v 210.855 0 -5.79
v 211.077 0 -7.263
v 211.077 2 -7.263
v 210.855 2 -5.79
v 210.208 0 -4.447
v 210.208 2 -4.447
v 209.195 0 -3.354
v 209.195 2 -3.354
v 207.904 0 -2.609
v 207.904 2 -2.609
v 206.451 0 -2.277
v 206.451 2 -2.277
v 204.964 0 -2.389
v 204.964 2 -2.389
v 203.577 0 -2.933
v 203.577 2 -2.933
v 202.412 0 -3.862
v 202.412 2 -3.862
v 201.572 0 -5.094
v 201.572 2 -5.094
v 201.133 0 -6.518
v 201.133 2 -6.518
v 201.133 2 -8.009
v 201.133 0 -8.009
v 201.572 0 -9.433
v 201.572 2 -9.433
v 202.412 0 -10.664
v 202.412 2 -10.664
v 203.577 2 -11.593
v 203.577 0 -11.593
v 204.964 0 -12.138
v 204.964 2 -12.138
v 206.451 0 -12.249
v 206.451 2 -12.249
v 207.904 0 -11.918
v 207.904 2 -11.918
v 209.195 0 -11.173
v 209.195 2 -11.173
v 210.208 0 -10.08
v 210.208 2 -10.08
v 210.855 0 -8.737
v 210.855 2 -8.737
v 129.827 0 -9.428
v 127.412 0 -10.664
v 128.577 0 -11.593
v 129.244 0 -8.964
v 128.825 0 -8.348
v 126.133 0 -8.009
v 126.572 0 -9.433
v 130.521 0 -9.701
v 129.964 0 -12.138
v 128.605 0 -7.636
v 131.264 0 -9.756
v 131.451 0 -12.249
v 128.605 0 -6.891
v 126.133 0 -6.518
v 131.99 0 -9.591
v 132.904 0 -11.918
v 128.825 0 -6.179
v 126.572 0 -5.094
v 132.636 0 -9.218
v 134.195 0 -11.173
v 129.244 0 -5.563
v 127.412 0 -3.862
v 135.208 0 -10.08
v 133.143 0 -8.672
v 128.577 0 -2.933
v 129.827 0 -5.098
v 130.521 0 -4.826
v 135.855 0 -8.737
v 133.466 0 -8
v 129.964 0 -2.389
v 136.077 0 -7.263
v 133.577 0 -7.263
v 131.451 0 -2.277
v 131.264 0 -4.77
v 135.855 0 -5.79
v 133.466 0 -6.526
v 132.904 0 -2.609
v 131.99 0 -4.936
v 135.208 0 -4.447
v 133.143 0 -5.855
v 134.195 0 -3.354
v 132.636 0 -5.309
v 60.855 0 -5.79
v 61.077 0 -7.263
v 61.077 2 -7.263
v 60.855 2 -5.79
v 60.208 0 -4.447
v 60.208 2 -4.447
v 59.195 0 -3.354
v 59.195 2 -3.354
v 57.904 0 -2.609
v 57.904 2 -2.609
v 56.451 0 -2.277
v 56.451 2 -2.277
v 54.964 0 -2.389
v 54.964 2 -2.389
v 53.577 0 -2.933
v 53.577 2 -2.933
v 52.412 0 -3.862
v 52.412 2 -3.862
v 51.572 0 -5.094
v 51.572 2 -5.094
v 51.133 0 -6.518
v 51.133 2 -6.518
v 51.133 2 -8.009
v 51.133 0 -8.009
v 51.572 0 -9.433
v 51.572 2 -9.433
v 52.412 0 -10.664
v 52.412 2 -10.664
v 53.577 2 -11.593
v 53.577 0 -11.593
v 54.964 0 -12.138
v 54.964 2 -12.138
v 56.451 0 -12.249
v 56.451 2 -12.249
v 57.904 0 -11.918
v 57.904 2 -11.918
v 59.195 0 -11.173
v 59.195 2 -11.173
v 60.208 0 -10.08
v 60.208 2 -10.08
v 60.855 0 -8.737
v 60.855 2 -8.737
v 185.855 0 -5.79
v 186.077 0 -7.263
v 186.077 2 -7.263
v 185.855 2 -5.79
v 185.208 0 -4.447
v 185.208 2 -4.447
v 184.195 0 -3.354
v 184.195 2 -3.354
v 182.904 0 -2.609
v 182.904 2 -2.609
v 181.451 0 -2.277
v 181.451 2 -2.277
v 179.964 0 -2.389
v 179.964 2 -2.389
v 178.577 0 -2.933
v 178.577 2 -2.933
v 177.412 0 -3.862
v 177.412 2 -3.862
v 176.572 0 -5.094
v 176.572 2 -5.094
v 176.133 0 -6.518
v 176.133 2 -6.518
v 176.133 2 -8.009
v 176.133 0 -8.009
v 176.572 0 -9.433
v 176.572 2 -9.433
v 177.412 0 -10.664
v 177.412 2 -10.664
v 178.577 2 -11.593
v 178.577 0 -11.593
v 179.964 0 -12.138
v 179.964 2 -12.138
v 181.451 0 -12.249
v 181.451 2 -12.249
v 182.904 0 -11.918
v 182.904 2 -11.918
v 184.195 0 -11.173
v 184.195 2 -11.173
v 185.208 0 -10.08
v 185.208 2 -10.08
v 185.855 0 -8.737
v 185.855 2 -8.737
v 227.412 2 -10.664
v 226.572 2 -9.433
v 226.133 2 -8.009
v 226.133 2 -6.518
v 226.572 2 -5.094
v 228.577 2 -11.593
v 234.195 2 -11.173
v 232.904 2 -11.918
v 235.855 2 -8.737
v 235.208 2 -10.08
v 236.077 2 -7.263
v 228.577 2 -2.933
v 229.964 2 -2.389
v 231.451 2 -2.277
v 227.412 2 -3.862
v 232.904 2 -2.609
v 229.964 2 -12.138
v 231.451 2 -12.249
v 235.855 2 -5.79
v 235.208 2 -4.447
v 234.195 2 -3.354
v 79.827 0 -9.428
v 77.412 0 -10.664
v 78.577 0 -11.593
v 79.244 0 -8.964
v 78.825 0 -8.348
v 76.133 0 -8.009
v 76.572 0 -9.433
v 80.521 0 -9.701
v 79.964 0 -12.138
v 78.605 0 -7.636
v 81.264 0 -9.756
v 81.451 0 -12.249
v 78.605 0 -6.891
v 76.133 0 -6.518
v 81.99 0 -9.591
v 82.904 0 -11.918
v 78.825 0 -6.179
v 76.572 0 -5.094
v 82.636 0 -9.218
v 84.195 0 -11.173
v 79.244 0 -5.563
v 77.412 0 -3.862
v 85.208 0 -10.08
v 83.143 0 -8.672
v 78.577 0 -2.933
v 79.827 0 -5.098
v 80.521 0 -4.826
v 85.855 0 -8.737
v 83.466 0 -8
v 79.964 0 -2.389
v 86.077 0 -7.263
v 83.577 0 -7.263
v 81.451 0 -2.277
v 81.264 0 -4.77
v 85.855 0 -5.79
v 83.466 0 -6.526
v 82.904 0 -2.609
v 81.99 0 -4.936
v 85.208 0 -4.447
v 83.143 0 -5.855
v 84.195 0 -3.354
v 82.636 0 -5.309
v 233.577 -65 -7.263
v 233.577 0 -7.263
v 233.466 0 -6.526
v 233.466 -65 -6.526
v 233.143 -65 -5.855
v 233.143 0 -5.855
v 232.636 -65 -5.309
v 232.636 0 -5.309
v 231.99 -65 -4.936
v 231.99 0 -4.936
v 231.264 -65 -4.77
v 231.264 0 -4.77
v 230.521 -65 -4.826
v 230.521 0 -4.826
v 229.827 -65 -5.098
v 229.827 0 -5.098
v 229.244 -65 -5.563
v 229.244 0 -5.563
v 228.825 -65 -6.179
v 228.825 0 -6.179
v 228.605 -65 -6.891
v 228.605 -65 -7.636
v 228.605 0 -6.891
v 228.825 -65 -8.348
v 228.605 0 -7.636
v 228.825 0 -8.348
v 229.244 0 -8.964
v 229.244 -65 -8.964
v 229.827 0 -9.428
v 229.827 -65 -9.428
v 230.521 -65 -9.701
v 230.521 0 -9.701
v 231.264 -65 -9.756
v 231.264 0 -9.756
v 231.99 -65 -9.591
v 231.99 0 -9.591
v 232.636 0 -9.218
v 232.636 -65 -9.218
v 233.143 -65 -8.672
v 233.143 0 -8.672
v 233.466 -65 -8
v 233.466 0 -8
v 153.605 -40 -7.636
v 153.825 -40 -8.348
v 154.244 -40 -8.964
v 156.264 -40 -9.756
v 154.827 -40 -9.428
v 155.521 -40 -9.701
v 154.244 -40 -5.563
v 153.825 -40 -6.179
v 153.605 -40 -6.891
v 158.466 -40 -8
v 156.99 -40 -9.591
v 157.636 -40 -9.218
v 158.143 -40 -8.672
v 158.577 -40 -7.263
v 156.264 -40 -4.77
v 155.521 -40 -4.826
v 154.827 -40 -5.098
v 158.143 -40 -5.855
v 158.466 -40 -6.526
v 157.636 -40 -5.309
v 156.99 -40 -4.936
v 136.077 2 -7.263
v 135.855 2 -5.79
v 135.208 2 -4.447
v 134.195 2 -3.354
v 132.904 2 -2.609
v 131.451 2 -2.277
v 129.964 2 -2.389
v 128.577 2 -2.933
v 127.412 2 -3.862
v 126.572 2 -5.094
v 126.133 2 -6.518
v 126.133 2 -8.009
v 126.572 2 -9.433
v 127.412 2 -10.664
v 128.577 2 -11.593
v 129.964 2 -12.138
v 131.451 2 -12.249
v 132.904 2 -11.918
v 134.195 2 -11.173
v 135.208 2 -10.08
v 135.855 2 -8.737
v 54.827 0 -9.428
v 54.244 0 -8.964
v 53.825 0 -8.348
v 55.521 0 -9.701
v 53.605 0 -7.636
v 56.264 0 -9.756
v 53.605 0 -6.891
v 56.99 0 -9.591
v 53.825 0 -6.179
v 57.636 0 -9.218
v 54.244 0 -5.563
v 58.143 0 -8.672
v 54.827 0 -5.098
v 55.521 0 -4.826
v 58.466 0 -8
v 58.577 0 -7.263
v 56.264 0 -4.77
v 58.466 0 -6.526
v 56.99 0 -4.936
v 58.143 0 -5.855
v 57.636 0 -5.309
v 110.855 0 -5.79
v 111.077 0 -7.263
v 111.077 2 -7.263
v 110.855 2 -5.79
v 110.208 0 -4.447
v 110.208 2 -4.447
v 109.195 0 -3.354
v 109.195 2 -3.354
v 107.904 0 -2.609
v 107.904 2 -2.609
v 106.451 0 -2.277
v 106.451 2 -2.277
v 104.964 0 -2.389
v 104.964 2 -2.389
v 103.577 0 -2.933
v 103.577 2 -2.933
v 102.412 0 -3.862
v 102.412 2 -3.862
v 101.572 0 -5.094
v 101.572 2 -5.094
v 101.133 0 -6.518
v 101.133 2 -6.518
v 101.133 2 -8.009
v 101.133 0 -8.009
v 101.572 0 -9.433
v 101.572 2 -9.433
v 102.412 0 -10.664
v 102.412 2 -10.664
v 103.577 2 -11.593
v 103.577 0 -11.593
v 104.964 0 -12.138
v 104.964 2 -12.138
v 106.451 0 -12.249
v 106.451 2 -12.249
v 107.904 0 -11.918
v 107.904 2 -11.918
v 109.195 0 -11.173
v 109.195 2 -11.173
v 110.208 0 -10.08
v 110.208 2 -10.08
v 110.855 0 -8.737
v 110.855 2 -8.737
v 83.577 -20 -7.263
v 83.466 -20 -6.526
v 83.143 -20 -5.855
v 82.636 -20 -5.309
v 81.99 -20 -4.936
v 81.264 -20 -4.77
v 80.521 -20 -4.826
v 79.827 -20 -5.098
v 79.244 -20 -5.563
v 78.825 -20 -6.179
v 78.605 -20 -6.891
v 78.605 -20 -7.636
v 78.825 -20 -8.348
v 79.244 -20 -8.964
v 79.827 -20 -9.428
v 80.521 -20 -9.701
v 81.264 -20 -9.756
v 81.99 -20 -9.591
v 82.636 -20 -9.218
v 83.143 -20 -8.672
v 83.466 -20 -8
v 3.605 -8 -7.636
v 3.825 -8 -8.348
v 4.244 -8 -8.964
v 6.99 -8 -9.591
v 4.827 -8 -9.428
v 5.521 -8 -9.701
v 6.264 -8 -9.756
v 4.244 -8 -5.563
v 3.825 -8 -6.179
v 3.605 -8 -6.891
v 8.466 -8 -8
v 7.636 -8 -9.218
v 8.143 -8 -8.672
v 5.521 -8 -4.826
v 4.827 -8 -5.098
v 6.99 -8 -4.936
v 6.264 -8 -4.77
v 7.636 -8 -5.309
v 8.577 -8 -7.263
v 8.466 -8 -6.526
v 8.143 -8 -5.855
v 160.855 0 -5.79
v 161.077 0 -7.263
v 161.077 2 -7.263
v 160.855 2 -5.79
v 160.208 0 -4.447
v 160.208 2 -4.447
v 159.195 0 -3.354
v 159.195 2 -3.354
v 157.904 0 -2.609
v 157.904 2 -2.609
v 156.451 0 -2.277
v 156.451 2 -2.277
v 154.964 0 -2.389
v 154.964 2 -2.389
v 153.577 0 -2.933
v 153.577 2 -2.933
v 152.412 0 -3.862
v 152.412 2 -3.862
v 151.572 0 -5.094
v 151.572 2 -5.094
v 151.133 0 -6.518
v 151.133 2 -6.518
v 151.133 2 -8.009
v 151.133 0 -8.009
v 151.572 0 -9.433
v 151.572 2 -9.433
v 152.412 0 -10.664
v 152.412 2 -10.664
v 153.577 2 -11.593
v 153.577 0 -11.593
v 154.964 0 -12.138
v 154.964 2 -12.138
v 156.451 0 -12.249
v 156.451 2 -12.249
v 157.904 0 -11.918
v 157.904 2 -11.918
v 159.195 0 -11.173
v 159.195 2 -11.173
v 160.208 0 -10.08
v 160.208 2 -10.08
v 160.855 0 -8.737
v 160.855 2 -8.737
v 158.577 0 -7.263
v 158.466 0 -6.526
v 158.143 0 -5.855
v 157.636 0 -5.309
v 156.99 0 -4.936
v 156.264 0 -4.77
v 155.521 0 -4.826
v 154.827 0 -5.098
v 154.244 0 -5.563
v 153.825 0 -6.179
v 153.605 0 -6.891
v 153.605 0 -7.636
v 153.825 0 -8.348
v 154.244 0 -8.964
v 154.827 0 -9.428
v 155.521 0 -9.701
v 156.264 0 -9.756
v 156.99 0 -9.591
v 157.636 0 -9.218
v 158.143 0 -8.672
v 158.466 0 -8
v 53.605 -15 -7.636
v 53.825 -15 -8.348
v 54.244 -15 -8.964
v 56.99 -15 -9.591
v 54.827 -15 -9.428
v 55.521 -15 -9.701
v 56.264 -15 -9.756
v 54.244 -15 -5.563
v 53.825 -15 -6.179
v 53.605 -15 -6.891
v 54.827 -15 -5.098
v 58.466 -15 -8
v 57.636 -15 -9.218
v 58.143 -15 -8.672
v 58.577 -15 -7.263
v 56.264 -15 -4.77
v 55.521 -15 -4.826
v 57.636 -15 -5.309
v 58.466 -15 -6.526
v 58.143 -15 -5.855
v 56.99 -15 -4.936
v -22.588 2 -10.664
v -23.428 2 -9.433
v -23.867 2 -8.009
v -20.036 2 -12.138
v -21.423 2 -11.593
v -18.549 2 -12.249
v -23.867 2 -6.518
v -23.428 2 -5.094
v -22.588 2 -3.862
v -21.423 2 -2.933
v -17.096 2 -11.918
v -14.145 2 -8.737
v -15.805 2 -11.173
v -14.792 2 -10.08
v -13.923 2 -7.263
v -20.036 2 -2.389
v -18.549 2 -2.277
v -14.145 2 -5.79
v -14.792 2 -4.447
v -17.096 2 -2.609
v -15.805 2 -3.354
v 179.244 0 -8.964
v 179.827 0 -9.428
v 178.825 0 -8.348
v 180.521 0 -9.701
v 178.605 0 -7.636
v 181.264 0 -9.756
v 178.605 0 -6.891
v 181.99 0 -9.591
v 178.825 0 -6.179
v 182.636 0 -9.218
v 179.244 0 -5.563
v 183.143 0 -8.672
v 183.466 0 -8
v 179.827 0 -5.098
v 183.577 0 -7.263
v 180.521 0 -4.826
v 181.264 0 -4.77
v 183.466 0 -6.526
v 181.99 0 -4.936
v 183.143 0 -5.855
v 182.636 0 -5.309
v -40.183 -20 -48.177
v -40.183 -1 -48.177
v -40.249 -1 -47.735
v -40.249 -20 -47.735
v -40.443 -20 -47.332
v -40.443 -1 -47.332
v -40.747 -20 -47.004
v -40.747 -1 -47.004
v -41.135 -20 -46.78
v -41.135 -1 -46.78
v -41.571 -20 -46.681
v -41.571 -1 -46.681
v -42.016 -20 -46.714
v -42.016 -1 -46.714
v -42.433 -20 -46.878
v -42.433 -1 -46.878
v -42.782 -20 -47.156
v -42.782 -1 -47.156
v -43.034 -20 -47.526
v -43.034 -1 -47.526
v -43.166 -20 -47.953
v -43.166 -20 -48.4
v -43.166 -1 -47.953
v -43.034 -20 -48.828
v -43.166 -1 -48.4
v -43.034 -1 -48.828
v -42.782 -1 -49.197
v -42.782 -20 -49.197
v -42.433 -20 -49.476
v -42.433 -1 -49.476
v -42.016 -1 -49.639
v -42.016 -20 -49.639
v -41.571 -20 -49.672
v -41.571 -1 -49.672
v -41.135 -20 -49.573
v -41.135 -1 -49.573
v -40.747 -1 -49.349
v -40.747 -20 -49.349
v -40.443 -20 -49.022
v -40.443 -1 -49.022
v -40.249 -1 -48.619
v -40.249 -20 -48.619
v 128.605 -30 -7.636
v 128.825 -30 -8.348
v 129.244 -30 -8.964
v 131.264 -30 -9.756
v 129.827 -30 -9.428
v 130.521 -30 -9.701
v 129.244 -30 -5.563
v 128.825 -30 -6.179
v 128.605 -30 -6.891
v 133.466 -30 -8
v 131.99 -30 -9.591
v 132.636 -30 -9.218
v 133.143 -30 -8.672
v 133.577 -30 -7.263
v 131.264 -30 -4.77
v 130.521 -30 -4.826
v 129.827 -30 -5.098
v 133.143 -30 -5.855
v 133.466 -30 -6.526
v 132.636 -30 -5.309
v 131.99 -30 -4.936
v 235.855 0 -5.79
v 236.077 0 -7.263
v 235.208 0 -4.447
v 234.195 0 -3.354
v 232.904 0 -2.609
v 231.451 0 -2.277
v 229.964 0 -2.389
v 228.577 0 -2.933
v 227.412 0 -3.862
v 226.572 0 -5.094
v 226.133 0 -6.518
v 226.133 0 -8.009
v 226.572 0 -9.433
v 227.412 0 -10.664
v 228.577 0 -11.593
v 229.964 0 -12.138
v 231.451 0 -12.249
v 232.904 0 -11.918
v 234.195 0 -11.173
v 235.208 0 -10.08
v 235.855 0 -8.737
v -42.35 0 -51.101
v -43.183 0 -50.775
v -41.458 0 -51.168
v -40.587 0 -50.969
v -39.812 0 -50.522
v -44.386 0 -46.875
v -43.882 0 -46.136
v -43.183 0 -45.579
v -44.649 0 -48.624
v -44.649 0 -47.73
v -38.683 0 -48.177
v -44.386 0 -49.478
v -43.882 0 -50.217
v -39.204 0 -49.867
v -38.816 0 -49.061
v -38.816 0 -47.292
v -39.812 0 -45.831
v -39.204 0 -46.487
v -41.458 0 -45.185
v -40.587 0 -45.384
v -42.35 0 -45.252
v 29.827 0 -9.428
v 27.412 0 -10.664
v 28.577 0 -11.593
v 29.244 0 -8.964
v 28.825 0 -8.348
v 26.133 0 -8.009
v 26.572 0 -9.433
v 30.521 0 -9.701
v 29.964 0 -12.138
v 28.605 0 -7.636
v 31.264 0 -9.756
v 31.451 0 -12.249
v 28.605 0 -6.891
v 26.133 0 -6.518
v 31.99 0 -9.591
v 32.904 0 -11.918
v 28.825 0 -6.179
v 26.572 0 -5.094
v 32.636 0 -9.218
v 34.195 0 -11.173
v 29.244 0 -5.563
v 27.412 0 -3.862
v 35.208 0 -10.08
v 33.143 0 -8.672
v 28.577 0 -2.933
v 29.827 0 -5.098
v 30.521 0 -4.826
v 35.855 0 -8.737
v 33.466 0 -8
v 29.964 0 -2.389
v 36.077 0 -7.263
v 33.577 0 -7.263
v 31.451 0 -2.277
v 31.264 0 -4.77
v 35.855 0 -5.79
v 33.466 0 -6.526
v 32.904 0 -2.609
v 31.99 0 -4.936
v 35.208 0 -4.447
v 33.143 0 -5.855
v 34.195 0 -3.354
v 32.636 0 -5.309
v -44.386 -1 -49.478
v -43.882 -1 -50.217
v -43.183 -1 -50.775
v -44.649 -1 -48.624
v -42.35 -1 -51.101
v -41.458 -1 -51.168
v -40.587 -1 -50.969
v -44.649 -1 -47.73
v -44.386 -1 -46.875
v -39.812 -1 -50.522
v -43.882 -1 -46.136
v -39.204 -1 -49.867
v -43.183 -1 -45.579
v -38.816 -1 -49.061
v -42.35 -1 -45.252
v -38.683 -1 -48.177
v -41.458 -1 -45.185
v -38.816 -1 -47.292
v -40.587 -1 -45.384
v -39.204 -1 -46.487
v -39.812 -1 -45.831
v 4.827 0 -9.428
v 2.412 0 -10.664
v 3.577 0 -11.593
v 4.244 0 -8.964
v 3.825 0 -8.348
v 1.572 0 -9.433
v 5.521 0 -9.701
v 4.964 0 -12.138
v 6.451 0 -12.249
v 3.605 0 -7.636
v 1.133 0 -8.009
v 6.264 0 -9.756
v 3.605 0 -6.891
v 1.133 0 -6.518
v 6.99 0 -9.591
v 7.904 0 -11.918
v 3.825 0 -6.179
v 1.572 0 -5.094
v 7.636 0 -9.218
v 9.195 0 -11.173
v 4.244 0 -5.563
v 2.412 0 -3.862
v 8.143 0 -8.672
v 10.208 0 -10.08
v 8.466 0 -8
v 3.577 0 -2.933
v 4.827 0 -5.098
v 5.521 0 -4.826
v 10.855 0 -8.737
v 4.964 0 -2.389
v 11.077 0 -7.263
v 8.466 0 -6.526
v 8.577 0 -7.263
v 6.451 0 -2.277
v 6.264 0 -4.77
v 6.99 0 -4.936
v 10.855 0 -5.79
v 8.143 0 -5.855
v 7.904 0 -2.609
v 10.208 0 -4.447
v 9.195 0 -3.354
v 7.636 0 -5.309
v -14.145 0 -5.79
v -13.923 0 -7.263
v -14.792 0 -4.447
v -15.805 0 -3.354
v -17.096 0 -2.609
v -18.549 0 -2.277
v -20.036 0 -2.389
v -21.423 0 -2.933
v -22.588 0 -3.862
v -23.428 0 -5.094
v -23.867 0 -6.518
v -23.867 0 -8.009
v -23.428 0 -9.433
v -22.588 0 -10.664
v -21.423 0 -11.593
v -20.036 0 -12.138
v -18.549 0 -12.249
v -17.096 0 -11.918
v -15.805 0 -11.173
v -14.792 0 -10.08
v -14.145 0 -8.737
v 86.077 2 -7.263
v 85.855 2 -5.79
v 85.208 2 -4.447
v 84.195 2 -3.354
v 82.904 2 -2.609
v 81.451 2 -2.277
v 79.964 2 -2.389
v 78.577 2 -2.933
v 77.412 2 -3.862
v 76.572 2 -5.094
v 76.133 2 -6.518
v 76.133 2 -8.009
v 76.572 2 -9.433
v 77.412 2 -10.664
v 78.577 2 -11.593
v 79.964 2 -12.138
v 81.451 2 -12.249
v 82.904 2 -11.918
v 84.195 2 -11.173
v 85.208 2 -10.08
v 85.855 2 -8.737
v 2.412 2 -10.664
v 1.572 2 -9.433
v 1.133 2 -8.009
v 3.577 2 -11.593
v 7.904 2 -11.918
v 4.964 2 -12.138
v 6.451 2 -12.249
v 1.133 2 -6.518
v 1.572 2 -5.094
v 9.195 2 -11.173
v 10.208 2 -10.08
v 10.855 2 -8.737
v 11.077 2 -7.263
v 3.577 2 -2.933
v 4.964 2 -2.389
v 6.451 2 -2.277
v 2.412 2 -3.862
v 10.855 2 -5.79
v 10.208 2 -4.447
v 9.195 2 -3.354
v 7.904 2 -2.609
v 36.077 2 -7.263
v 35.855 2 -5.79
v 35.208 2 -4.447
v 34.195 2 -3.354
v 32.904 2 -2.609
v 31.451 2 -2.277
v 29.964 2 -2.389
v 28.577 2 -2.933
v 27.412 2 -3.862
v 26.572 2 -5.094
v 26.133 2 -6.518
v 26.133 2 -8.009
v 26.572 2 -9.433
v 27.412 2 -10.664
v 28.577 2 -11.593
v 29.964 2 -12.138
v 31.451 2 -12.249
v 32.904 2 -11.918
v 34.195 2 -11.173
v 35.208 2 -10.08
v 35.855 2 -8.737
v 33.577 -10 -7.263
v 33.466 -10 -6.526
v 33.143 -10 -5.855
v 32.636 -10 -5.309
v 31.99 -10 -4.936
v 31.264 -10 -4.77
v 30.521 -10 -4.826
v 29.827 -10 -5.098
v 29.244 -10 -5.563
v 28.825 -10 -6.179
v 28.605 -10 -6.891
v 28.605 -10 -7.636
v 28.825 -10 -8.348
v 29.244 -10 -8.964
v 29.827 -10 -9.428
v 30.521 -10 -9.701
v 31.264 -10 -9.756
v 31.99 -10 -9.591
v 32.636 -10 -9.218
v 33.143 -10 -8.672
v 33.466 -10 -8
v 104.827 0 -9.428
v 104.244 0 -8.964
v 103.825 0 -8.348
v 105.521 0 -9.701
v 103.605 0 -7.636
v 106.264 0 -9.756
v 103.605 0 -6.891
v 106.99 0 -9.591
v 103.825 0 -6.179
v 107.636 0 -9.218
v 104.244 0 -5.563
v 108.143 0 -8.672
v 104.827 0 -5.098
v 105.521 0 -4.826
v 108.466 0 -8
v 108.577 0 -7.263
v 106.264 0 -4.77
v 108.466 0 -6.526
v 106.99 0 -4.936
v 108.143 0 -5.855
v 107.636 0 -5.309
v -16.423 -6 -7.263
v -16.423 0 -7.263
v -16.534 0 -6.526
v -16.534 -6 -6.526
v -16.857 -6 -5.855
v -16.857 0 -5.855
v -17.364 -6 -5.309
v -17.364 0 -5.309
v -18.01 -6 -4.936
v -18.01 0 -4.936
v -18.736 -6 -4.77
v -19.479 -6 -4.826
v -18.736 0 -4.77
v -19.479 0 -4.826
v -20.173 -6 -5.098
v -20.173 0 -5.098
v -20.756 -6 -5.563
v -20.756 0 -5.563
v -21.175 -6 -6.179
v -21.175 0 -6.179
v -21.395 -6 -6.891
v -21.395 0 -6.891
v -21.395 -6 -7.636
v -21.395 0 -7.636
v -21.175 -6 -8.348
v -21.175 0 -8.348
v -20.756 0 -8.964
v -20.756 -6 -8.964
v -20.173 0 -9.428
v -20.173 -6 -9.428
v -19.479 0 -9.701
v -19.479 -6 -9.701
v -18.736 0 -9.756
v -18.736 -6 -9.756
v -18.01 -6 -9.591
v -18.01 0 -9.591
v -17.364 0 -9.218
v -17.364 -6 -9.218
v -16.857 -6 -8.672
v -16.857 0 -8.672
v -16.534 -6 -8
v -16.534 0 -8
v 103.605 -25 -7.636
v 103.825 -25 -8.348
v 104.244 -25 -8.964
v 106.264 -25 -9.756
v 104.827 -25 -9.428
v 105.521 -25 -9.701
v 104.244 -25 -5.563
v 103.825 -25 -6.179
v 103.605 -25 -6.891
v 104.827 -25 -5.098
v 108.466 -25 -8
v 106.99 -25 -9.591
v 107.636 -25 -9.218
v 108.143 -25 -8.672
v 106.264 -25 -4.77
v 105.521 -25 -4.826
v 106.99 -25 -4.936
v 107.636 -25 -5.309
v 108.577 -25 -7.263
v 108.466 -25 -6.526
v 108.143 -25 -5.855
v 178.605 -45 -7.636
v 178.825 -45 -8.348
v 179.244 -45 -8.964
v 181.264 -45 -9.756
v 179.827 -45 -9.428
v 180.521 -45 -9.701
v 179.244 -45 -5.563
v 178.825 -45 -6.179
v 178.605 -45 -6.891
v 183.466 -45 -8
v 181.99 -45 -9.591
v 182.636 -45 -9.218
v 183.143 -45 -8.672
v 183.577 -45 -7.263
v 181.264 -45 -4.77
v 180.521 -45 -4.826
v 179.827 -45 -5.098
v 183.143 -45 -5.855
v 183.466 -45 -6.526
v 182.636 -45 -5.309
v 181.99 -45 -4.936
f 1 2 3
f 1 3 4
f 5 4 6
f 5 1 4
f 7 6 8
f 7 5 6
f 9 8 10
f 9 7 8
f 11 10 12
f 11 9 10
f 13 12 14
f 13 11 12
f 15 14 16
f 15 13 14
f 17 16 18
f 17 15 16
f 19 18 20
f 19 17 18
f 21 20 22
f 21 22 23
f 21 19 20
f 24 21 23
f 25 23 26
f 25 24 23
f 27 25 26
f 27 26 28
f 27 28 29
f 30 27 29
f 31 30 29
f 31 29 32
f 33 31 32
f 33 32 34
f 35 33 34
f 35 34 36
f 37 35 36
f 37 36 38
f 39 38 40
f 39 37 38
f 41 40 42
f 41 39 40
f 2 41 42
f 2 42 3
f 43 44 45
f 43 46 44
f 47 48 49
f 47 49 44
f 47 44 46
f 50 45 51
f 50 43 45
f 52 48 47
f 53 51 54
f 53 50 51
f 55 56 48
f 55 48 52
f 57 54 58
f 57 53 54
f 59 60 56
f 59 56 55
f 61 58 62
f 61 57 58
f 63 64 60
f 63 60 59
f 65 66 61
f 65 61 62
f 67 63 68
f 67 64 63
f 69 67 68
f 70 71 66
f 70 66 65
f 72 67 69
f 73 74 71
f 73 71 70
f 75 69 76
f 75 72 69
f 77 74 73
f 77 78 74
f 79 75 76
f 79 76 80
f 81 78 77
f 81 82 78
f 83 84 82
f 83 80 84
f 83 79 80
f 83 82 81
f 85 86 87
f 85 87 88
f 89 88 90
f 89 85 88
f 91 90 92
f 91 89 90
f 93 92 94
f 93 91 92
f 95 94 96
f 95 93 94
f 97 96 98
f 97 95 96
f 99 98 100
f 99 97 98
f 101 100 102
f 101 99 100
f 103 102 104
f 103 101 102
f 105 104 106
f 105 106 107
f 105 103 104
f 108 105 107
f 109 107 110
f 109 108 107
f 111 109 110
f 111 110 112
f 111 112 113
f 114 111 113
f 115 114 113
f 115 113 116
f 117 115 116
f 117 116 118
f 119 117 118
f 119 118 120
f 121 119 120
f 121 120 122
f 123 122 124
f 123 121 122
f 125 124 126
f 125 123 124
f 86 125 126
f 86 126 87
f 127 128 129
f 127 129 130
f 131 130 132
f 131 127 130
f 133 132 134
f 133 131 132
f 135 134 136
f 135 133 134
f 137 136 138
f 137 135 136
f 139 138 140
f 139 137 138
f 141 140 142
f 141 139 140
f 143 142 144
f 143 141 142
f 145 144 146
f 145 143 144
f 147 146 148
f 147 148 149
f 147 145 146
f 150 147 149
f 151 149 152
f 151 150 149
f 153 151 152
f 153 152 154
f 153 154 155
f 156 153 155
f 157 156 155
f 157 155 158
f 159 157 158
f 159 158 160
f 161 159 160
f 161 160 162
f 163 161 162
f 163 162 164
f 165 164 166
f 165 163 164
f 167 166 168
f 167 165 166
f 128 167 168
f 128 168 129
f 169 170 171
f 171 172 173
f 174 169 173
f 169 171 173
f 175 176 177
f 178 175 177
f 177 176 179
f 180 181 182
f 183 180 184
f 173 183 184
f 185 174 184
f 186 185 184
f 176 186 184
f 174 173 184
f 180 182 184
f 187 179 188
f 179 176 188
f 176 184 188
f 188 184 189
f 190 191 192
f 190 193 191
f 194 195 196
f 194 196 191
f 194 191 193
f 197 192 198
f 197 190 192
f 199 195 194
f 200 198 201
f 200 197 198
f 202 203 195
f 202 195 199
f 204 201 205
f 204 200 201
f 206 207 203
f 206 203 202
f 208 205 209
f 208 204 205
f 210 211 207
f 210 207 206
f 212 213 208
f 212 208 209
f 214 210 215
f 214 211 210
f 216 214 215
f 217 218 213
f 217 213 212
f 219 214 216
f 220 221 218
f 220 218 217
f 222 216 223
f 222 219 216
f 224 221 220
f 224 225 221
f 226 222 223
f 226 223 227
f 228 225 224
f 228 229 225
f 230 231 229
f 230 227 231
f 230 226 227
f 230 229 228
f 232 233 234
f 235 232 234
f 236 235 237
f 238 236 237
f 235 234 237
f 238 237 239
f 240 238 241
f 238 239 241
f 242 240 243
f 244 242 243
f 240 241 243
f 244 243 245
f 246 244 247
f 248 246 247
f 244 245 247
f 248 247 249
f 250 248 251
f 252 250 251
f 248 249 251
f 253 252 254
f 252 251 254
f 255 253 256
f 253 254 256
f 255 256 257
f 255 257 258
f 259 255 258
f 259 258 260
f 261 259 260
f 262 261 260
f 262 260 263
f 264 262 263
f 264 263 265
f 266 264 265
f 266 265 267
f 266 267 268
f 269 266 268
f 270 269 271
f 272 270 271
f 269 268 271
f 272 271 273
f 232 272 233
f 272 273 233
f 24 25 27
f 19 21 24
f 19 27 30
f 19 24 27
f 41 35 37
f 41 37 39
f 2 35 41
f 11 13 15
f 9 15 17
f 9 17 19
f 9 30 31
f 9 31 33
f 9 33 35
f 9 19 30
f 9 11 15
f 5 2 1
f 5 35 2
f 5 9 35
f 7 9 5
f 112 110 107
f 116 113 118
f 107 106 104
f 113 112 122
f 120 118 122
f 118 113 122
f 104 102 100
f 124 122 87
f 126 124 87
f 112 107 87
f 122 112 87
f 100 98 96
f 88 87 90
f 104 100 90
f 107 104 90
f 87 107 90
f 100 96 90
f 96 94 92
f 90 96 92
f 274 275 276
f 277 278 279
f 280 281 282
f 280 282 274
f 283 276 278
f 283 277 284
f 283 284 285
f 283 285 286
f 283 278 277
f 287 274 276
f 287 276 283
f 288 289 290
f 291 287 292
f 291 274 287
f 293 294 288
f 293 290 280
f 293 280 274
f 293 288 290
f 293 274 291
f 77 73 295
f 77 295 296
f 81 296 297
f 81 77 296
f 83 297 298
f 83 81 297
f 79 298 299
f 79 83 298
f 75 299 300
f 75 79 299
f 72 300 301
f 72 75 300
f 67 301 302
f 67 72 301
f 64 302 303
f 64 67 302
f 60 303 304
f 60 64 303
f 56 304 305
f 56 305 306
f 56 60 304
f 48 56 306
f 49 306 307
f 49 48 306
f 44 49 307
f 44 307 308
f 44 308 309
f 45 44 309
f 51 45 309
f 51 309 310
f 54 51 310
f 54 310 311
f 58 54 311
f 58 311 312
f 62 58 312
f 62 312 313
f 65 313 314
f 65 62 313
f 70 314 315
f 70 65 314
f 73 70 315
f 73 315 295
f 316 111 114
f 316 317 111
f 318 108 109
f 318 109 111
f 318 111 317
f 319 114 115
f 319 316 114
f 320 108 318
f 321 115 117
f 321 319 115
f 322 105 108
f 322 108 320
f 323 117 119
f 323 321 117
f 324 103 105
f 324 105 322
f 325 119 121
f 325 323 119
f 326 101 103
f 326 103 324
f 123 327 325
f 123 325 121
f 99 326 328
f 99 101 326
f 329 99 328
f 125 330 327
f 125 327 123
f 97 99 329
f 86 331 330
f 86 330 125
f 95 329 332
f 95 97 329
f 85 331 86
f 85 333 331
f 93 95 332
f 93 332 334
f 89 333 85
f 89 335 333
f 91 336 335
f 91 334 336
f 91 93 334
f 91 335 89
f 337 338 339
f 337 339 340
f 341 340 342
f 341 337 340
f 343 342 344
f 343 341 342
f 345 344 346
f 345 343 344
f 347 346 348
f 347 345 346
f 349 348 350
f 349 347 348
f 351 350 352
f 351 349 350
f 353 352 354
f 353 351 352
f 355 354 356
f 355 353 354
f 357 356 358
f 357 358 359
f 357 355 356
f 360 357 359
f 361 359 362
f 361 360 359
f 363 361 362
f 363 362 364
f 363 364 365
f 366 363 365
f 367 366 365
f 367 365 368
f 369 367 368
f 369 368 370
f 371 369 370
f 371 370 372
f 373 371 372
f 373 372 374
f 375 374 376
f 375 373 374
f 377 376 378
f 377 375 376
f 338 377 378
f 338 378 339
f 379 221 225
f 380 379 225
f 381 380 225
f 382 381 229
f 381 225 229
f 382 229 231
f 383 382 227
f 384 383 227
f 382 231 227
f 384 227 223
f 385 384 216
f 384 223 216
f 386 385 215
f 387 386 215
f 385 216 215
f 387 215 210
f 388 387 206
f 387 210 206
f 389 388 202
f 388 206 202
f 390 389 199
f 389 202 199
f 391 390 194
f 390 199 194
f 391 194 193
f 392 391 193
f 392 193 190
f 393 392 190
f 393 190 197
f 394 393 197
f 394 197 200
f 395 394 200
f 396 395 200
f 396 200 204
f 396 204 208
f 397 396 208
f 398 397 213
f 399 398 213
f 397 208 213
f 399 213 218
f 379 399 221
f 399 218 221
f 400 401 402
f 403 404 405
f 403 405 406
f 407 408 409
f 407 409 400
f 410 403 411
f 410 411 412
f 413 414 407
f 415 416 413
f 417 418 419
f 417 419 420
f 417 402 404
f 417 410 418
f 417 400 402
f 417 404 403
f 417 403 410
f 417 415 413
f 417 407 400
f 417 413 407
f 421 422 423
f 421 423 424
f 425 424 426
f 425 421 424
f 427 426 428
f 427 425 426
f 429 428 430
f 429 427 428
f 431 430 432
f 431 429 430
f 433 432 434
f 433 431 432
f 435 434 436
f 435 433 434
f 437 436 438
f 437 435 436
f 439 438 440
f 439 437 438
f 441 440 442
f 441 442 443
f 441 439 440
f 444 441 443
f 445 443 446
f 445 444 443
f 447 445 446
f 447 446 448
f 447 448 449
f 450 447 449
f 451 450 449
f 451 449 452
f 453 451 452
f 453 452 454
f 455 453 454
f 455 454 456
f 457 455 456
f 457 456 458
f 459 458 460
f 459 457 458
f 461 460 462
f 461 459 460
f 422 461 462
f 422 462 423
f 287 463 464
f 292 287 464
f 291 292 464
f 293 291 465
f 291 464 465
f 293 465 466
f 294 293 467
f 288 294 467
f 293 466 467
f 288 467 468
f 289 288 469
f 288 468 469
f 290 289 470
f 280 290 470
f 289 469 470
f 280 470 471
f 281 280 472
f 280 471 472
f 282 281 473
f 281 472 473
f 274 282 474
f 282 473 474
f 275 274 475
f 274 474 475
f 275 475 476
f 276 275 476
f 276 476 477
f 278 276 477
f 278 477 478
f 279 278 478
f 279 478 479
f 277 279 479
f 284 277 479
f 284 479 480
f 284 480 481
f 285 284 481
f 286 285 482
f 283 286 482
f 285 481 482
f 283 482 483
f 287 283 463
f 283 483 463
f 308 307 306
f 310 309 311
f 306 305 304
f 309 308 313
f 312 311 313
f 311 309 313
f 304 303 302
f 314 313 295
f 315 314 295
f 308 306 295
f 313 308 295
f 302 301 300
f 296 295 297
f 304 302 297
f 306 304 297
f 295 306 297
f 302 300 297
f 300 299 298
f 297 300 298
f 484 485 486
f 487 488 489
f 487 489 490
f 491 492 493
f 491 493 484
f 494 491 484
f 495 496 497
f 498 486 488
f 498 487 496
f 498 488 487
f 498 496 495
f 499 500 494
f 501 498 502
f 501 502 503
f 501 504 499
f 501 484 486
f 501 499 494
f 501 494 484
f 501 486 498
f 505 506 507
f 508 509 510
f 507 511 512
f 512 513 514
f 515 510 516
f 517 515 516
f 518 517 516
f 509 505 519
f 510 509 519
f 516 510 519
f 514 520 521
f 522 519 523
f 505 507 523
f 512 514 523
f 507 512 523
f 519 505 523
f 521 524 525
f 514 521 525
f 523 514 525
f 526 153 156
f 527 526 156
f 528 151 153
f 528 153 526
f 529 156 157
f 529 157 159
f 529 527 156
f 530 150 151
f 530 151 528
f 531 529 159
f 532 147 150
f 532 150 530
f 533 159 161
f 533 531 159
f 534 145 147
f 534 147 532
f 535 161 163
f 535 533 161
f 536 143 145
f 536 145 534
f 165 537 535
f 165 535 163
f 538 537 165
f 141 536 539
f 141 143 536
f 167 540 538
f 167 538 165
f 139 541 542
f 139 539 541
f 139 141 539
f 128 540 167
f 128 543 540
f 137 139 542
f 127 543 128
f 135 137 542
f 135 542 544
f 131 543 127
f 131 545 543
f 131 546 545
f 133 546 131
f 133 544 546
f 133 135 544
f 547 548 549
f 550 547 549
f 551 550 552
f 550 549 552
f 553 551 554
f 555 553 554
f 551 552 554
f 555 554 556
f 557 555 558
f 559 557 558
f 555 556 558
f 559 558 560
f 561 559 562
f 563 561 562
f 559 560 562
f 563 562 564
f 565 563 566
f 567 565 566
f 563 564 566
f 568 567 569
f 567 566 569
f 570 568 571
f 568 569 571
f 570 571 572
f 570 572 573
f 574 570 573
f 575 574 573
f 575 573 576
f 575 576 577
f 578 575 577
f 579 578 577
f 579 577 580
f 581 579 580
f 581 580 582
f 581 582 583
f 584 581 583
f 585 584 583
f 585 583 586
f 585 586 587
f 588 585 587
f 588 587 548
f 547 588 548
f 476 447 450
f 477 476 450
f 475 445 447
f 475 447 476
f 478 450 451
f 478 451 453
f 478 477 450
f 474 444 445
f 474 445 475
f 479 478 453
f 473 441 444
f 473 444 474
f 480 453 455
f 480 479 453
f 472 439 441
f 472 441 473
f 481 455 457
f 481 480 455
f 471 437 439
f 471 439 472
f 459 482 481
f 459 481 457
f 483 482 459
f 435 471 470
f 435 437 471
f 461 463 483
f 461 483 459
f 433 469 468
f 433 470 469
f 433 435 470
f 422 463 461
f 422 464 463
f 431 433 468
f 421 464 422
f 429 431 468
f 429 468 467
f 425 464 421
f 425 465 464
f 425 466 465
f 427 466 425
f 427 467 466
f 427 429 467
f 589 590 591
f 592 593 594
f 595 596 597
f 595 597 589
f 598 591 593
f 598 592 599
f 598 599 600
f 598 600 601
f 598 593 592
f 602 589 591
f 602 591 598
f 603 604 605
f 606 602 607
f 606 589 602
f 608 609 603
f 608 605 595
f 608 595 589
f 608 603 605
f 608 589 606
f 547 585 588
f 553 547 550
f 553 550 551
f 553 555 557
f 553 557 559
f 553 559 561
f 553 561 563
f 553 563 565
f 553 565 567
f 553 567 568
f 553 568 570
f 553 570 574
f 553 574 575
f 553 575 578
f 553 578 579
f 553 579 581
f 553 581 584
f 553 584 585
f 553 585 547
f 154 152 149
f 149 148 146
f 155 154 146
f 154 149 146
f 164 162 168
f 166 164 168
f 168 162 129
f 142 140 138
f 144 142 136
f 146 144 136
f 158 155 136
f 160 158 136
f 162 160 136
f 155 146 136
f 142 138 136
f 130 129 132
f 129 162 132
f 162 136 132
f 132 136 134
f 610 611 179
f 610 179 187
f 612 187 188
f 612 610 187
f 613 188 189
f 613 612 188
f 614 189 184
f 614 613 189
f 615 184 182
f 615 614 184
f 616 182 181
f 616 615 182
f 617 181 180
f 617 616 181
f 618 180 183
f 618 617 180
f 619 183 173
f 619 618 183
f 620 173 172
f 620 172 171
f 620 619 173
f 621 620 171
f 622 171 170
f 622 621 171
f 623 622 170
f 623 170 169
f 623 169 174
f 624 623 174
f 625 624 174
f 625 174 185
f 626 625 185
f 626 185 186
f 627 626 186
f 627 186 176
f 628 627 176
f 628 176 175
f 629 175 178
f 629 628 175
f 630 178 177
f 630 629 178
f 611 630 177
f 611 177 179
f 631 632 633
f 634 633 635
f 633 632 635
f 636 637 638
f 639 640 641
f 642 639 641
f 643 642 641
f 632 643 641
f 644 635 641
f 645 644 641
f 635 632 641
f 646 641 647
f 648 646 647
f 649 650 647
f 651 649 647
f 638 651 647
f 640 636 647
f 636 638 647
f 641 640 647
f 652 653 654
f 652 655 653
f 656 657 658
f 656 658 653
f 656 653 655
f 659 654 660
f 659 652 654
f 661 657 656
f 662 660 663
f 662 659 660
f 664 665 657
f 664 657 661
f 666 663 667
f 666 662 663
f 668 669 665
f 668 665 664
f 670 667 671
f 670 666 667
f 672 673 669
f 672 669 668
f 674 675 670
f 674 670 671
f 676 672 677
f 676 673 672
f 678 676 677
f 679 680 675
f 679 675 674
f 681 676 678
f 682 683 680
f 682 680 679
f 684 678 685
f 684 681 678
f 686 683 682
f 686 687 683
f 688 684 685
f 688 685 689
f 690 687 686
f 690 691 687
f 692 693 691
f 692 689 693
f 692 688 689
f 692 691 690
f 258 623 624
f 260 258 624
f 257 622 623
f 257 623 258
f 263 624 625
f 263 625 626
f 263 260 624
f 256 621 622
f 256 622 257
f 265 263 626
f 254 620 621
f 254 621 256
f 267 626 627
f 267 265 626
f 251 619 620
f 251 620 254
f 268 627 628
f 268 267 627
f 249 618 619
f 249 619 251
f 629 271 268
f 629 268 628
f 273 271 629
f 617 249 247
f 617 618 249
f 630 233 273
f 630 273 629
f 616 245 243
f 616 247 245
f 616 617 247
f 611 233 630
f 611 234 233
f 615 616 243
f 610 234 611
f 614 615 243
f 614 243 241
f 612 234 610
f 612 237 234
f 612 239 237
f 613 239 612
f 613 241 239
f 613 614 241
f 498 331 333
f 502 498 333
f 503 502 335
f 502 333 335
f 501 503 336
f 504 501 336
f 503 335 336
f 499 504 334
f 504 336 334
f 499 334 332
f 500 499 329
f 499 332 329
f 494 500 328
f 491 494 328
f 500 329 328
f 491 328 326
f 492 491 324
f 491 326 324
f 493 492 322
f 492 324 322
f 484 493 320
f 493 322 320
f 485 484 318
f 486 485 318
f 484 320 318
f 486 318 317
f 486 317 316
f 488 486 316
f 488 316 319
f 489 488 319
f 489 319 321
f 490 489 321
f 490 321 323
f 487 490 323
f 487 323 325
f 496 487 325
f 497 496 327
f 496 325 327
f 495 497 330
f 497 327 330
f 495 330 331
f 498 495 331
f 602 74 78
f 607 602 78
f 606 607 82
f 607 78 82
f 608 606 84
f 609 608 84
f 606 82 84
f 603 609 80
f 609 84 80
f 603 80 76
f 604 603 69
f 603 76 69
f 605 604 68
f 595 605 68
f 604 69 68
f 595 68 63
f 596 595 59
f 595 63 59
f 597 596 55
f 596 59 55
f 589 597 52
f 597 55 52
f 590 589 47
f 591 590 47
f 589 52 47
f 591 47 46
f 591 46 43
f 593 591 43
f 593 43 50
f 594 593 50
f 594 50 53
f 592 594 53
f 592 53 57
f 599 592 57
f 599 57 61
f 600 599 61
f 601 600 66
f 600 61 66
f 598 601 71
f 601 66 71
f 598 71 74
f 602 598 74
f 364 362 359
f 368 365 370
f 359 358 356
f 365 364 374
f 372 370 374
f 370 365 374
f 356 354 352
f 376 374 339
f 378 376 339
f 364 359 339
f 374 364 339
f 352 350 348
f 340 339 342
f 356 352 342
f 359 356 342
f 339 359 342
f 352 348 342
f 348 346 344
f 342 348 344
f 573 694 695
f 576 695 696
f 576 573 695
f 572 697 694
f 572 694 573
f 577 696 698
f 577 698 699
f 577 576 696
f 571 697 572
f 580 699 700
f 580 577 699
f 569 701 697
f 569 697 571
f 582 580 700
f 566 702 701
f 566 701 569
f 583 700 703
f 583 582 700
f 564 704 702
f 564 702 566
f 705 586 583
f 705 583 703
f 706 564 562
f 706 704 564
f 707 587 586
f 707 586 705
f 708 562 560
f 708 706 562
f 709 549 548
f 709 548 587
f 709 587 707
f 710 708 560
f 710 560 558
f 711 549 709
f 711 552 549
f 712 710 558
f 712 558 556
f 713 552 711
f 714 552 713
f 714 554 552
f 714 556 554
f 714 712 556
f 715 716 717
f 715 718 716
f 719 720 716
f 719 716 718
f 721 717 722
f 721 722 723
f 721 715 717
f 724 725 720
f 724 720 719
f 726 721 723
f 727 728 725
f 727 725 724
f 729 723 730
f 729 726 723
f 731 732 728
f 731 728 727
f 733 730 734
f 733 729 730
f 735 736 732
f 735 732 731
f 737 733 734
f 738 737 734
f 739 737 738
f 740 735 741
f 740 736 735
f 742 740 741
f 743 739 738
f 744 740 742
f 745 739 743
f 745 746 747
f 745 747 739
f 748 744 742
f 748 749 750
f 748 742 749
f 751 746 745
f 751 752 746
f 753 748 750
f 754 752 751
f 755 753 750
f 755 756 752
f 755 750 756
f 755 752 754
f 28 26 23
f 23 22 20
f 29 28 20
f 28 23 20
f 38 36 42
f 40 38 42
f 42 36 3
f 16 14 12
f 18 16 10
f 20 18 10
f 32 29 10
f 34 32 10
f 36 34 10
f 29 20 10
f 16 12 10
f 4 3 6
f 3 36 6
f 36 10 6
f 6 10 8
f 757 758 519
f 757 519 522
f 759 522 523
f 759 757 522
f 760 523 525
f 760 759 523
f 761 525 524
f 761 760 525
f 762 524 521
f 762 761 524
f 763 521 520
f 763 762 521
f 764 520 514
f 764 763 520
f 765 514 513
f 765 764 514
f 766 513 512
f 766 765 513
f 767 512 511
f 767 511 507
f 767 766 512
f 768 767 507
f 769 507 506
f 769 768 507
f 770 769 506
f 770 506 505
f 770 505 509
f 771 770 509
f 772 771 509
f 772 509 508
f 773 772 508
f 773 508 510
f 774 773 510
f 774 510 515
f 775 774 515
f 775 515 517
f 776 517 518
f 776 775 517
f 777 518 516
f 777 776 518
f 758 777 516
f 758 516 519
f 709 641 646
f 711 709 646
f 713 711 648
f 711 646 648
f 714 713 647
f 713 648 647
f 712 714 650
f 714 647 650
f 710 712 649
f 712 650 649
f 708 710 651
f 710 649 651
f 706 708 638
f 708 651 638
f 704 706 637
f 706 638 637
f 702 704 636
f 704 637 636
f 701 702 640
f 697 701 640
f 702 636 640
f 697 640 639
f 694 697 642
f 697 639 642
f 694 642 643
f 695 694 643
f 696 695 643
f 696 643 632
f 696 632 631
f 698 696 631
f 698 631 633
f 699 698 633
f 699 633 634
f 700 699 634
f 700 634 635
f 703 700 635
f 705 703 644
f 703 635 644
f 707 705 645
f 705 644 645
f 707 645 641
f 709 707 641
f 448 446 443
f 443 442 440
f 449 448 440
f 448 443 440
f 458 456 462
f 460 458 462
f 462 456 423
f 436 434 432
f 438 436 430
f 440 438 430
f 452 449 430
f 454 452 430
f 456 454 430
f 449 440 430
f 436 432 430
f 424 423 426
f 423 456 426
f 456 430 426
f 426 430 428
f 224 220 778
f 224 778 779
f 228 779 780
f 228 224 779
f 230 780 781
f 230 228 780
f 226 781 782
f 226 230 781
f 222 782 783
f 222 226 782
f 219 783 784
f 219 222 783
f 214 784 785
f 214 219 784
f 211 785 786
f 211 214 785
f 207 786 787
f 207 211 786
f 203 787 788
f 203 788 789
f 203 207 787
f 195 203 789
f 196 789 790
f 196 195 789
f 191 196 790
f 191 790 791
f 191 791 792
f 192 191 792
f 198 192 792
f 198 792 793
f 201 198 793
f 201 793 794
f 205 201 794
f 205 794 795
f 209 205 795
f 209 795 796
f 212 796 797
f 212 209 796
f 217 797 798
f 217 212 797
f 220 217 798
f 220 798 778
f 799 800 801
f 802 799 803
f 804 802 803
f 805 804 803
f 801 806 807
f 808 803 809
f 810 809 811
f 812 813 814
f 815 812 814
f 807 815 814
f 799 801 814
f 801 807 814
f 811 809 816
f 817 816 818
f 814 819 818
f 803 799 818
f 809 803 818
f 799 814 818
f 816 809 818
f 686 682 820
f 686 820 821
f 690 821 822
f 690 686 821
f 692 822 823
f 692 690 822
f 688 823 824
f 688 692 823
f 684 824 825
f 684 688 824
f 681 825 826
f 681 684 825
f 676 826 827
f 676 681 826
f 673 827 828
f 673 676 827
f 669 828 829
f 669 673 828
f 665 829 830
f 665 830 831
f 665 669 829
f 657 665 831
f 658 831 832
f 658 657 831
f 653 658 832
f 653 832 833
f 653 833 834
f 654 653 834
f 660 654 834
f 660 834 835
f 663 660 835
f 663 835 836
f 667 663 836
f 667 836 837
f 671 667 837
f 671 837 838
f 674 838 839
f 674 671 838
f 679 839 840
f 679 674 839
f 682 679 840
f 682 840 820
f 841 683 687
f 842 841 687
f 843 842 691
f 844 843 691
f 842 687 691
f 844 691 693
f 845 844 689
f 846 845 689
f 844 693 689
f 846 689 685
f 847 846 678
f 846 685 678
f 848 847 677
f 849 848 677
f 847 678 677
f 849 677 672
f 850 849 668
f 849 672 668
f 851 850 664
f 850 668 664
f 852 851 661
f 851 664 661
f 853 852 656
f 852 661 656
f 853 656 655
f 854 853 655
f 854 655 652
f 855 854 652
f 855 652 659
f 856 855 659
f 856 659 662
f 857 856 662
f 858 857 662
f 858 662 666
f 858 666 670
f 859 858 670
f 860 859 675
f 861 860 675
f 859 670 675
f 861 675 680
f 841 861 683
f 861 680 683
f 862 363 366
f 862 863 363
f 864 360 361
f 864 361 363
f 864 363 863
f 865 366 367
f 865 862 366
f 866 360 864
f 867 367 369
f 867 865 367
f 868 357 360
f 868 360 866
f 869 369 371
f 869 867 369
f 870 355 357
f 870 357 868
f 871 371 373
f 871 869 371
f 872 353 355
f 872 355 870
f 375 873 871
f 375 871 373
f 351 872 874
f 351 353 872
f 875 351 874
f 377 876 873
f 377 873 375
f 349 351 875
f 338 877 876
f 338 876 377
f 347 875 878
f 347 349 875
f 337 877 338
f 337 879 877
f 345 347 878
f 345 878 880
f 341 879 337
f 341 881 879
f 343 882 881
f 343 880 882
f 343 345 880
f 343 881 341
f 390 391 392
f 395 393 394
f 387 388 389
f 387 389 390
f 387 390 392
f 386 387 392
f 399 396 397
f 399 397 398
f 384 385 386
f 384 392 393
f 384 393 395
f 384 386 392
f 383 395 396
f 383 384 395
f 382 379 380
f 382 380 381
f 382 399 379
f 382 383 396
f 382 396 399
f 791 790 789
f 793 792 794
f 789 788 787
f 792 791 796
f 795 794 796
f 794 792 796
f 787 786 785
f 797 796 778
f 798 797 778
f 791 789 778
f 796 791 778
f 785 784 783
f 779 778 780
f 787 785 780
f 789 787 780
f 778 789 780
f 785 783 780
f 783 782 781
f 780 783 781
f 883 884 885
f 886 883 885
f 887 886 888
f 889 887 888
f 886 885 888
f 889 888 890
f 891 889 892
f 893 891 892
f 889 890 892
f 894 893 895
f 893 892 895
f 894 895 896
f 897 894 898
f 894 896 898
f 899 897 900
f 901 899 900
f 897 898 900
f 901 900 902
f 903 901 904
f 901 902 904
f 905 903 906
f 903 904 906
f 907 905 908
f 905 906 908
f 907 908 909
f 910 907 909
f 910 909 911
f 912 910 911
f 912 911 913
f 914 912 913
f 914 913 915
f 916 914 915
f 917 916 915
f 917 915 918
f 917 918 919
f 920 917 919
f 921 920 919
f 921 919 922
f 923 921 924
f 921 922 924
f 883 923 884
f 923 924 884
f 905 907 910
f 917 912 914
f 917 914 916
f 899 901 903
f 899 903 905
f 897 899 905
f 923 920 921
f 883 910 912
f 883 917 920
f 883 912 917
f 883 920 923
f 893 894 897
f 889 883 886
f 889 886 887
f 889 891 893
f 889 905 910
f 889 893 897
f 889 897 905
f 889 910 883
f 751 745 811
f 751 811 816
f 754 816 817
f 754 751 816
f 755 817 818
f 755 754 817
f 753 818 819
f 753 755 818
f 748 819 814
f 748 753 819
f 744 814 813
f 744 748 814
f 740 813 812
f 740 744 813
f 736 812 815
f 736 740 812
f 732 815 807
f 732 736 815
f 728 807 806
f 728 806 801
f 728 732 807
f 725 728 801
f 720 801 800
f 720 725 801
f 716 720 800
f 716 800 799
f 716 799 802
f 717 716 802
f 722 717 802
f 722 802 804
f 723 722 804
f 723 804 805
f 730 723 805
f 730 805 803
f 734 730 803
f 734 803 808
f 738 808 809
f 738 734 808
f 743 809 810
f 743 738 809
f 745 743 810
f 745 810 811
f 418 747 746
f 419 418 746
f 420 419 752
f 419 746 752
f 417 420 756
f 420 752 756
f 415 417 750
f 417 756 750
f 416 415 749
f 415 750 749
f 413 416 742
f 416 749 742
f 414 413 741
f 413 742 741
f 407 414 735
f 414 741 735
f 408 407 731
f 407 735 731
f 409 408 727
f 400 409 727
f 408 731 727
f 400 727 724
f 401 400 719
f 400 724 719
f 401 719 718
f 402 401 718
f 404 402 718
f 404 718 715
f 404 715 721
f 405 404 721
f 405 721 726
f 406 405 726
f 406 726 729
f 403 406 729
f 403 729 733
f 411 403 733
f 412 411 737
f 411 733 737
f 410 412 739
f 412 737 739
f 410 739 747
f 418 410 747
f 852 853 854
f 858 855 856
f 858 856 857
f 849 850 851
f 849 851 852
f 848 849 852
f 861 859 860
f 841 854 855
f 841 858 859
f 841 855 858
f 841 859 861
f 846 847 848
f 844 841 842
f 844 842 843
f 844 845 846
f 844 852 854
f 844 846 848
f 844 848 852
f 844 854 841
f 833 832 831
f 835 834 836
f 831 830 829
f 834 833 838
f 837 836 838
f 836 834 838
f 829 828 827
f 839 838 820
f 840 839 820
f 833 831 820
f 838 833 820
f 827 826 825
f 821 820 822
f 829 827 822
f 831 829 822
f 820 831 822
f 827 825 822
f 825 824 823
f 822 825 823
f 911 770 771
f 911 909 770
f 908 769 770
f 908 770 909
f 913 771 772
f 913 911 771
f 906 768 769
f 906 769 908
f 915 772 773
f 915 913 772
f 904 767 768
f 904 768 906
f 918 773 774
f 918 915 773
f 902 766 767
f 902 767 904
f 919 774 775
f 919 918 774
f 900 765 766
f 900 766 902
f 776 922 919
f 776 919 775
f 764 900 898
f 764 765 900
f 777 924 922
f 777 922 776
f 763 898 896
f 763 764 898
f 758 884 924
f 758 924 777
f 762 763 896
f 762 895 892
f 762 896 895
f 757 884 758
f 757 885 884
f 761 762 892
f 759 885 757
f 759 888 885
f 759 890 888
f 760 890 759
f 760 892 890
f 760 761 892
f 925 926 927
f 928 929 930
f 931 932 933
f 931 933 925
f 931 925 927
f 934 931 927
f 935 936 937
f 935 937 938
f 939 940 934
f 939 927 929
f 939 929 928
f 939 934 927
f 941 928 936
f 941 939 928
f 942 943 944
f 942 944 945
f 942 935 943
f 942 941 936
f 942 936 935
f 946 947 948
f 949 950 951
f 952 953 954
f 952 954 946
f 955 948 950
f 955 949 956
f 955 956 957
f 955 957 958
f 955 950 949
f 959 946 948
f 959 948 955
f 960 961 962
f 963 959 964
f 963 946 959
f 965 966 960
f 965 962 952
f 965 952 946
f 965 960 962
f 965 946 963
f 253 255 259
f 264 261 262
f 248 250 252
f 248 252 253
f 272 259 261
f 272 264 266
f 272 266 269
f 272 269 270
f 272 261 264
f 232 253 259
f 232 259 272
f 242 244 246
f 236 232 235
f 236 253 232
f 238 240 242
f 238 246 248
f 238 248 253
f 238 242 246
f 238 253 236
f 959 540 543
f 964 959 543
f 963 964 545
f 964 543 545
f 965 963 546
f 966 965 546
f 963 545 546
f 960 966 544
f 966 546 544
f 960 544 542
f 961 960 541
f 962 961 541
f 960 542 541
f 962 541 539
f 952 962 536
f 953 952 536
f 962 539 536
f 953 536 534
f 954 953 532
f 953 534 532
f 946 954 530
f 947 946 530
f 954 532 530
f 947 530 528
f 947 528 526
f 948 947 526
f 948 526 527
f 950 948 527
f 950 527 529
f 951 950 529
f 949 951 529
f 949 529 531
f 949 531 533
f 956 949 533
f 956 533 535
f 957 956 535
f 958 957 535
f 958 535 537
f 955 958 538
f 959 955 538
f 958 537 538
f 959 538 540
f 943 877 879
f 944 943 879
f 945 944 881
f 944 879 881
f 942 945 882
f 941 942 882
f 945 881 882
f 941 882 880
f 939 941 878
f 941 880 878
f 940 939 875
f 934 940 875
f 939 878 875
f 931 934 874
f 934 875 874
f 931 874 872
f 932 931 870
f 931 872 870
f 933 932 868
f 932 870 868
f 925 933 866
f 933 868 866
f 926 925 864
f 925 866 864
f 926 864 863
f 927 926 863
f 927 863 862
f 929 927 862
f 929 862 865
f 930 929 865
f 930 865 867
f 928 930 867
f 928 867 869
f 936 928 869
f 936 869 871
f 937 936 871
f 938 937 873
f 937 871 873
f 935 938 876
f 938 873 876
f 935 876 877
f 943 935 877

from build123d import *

# Parameters (mm, degrees)
F0_R      = 5
F0_R_2    = 2.5
F1_DEPTH  = 2
F2_DEPTH  = 6
F3_DEPTH  = 8
F4_DEPTH  = 10
F5_DEPTH  = 15
F6_DEPTH  = 20
F7_DEPTH  = 25
F8_DEPTH  = 30
F9_DEPTH  = 40
F10_DEPTH = 45
F12_DEPTH = 65
F0_R_3    = 3
F0_R_4    = 1.5
F13_DEPTH = 1
F14_DEPTH = 20


# Not quite as in the source:
# - the program builds the solid bodies; features that only make, move or delete a surface that nothing else refers to are left out


with BuildPart() as f1:
    # F0 (on Front) → F1 (new body)
    with BuildSketch(Plane.XZ):
        with Locations((-18.9229398966, -7.2633498348)):
            Circle(F0_R)
        with Locations((-18.9229398966, -7.2633498348)):
            Circle(F0_R_2, mode=Mode.SUBTRACT)
        with Locations((-18.9229398966, -7.2633498348)):
            Circle(F0_R_2)
    extrude(amount=-F1_DEPTH)

    # F0 (on Front) → F2 (join)
    with BuildSketch(Plane.XZ):
        with Locations((-18.9229398966, -7.2633498348)):
            Circle(F0_R_2)
    extrude(amount=F2_DEPTH)


with BuildPart() as f1b:
    # F0 (on Front) → F1, piece 2 (new body)
    with BuildSketch(Plane.XZ):
        with Locations((6.0770601034, -7.2633498348)):
            Circle(F0_R)
        with Locations((6.0770601034, -7.2633498348)):
            Circle(F0_R_2, mode=Mode.SUBTRACT)
        with Locations((6.0770601034, -7.2633498348)):
            Circle(F0_R_2)
    extrude(amount=-F1_DEPTH)

    # F0 (on Front) → F3 (join)
    with BuildSketch(Plane.XZ):
        with Locations((6.0770601034, -7.2633498348)):
            Circle(F0_R_2)
    extrude(amount=F3_DEPTH)


with BuildPart() as f1c:
    # F0 (on Front) → F1, piece 3 (new body)
    with BuildSketch(Plane.XZ):
        with Locations((31.0770601034, -7.2633498348)):
            Circle(F0_R)
        with Locations((31.0770601034, -7.2633498348)):
            Circle(F0_R_2, mode=Mode.SUBTRACT)
        with Locations((31.0770601034, -7.2633498348)):
            Circle(F0_R_2)
    extrude(amount=-F1_DEPTH)

    # F0 (on Front) → F4 (join)
    with BuildSketch(Plane.XZ):
        with Locations((31.0770601034, -7.2633498348)):
            Circle(F0_R_2)
    extrude(amount=F4_DEPTH)


with BuildPart() as f1d:
    # F0 (on Front) → F1, piece 4 (new body)
    with BuildSketch(Plane.XZ):
        with Locations((56.0770601034, -7.2633498348)):
            Circle(F0_R)
        with Locations((56.0770601034, -7.2633498348)):
            Circle(F0_R_2, mode=Mode.SUBTRACT)
        with Locations((56.0770601034, -7.2633498348)):
            Circle(F0_R_2)
    extrude(amount=-F1_DEPTH)

    # F0 (on Front) → F5 (join)
    with BuildSketch(Plane.XZ):
        with Locations((56.0770601034, -7.2633498348)):
            Circle(F0_R_2)
    extrude(amount=F5_DEPTH)


with BuildPart() as f1e:
    # F0 (on Front) → F1, piece 5 (new body)
    with BuildSketch(Plane.XZ):
        with Locations((156.0770601034, -7.2633498348)):
            Circle(F0_R)
        with Locations((156.0770601034, -7.2633498348)):
            Circle(F0_R_2, mode=Mode.SUBTRACT)
        with Locations((156.0770601034, -7.2633498348)):
            Circle(F0_R_2)
    extrude(amount=-F1_DEPTH)

    # F0 (on Front) → F9 (join)
    with BuildSketch(Plane.XZ):
        with Locations((156.0770601034, -7.2633498348)):
            Circle(F0_R_2)
    extrude(amount=F9_DEPTH)


with BuildPart() as f1f:
    # F0 (on Front) → F1, piece 6 (new body)
    with BuildSketch(Plane.XZ):
        with Locations((131.0770601034, -7.2633498348)):
            Circle(F0_R)
        with Locations((131.0770601034, -7.2633498348)):
            Circle(F0_R_2, mode=Mode.SUBTRACT)
        with Locations((131.0770601034, -7.2633498348)):
            Circle(F0_R_2)
    extrude(amount=-F1_DEPTH)

    # F0 (on Front) → F8 (join)
    with BuildSketch(Plane.XZ):
        with Locations((131.0770601034, -7.2633498348)):
            Circle(F0_R_2)
    extrude(amount=F8_DEPTH)


with BuildPart() as f1g:
    # F0 (on Front) → F1, piece 7 (new body)
    with BuildSketch(Plane.XZ):
        with Locations((106.0770601034, -7.2633498348)):
            Circle(F0_R)
        with Locations((106.0770601034, -7.2633498348)):
            Circle(F0_R_2, mode=Mode.SUBTRACT)
        with Locations((106.0770601034, -7.2633498348)):
            Circle(F0_R_2)
    extrude(amount=-F1_DEPTH)

    # F0 (on Front) → F7 (join)
    with BuildSketch(Plane.XZ):
        with Locations((106.0770601034, -7.2633498348)):
            Circle(F0_R_2)
    extrude(amount=F7_DEPTH)


with BuildPart() as f1h:
    # F0 (on Front) → F1, piece 8 (new body)
    with BuildSketch(Plane.XZ):
        with Locations((81.0770601034, -7.2633498348)):
            Circle(F0_R)
        with Locations((81.0770601034, -7.2633498348)):
            Circle(F0_R_2, mode=Mode.SUBTRACT)
        with Locations((81.0770601034, -7.2633498348)):
            Circle(F0_R_2)
    extrude(amount=-F1_DEPTH)

    # F0 (on Front) → F6 (join)
    with BuildSketch(Plane.XZ):
        with Locations((81.0770601034, -7.2633498348)):
            Circle(F0_R_2)
    extrude(amount=F6_DEPTH)


with BuildPart() as f1i:
    # F0 (on Front) → F1, piece 9 (new body)
    with BuildSketch(Plane.XZ):
        with Locations((206.0770601034, -7.2633498348)):
            Circle(F0_R)
        with Locations((206.0770601034, -7.2633498348)):
            Circle(F0_R_2, mode=Mode.SUBTRACT)
        with Locations((206.0770601034, -7.2633498348)):
            Circle(F0_R_2)
    extrude(amount=-F1_DEPTH)


with BuildPart() as f1j:
    # F0 (on Front) → F1, piece 10 (new body)
    with BuildSketch(Plane.XZ):
        with Locations((181.0770601034, -7.2633498348)):
            Circle(F0_R)
        with Locations((181.0770601034, -7.2633498348)):
            Circle(F0_R_2, mode=Mode.SUBTRACT)
        with Locations((181.0770601034, -7.2633498348)):
            Circle(F0_R_2)
    extrude(amount=-F1_DEPTH)

    # F0 (on Front) → F10 (join)
    with BuildSketch(Plane.XZ):
        with Locations((181.0770601034, -7.2633498348)):
            Circle(F0_R_2)
    extrude(amount=F10_DEPTH)


with BuildPart() as f1k:
    # F0 (on Front) → F1, piece 11 (new body)
    with BuildSketch(Plane.XZ):
        with Locations((231.0770601034, -7.2633498348)):
            Circle(F0_R)
        with Locations((231.0770601034, -7.2633498348)):
            Circle(F0_R_2, mode=Mode.SUBTRACT)
        with Locations((231.0770601034, -7.2633498348)):
            Circle(F0_R_2)
    extrude(amount=-F1_DEPTH)

    # F0 (on Front) → F12 (join)
    with BuildSketch(Plane.XZ):
        with Locations((231.0770601034, -7.2633498348)):
            Circle(F0_R_2)
    extrude(amount=F12_DEPTH)


with BuildPart() as f13:
    # F0 (on Front) → F13 (new body)
    with BuildSketch(Plane.XZ):
        with Locations((-41.6826158762, -48.1766760349)):
            Circle(F0_R_3)
        with Locations((-41.6826158762, -48.1766760349)):
            Circle(F0_R_4, mode=Mode.SUBTRACT)
    extrude(amount=F13_DEPTH)

    # F0 (on Front) → F14 (join)
    with BuildSketch(Plane.XZ):
        with Locations((-41.6826158762, -48.1766760349)):
            Circle(F0_R_4)
    extrude(amount=F14_DEPTH)


solid = Compound([f1.part, f1b.part, f1c.part, f1d.part, f1e.part, f1f.part, f1g.part, f1h.part, f1i.part, f1j.part, f1k.part, f13.part])
